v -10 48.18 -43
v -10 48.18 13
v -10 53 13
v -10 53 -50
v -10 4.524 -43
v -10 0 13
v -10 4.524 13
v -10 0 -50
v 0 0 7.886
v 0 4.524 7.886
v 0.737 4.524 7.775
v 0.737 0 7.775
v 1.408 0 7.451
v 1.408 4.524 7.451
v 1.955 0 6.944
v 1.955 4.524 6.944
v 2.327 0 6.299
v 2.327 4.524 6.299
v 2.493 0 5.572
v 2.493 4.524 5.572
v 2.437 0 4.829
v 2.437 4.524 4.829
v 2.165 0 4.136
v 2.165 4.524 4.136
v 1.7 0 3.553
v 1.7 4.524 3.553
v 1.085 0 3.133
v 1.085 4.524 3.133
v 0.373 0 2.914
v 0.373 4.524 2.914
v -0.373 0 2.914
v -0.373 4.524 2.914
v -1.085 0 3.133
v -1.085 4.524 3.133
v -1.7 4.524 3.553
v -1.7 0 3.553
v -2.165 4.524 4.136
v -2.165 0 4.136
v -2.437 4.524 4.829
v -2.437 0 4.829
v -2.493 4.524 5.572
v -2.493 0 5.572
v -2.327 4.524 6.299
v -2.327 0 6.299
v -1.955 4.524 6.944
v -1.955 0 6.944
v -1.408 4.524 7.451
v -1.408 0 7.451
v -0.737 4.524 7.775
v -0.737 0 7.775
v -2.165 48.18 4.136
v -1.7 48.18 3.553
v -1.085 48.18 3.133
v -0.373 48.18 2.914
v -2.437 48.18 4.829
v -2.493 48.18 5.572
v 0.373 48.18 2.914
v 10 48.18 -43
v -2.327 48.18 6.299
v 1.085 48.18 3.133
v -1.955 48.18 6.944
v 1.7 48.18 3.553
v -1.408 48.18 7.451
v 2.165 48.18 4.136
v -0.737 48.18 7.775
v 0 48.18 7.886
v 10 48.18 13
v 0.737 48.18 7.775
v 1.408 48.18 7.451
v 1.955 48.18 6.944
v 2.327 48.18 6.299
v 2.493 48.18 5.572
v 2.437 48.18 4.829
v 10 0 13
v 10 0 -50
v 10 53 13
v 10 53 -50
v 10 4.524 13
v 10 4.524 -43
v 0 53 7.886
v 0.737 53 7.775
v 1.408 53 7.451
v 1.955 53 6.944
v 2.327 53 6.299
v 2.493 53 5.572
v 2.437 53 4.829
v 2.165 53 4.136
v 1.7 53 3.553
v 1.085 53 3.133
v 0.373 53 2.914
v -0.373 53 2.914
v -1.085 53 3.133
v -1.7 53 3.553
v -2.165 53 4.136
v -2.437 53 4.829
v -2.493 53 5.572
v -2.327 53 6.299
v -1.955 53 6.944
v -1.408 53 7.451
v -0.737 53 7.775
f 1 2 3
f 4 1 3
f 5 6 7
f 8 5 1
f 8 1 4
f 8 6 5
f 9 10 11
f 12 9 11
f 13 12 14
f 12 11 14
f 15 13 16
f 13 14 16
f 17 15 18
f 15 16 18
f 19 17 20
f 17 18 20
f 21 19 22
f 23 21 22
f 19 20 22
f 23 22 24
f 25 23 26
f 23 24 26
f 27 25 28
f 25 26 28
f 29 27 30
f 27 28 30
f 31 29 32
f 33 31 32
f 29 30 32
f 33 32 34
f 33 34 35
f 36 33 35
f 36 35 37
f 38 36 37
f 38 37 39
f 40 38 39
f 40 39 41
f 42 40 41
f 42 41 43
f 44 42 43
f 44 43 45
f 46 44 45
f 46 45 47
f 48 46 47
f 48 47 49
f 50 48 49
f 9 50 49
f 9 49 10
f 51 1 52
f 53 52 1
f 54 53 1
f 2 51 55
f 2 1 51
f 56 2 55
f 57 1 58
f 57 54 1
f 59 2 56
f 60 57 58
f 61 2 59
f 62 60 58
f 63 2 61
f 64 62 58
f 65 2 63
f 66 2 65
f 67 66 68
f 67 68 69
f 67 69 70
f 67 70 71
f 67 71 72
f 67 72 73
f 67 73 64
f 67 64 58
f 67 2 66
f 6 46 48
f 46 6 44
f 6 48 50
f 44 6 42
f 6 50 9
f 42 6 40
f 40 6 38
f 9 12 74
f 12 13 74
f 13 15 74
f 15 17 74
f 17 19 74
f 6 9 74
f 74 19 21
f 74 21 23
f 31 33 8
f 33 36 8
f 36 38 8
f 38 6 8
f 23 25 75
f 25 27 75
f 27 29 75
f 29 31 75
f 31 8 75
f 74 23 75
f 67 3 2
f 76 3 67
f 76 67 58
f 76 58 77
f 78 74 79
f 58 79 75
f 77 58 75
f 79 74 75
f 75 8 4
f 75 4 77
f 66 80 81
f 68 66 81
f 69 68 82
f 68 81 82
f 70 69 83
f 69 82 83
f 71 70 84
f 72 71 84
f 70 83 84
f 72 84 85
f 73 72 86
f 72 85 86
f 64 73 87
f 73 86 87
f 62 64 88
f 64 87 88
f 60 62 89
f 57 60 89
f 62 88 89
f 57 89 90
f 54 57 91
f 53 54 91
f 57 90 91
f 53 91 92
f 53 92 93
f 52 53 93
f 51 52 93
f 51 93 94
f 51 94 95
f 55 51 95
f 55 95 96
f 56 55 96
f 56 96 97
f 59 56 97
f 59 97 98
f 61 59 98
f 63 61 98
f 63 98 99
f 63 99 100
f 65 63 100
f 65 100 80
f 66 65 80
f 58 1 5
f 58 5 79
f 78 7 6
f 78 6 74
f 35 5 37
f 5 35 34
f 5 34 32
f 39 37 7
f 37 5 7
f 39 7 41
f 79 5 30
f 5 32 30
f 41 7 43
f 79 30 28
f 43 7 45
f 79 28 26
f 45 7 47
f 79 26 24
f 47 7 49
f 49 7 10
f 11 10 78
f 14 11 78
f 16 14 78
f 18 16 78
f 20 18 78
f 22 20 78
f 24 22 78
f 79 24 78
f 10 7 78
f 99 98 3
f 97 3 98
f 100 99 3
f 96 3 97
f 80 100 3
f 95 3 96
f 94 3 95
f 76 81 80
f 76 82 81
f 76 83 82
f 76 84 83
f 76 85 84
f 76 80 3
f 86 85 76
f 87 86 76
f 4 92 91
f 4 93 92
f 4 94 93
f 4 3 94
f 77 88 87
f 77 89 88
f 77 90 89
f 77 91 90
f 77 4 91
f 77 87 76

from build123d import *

# Parameters (mm, degrees)
SKETCH1_W           = 20
SKETCH1_H           = 100
BOSS_EXTRUDE1_DEPTH = 53
SKETCH2_W           = 20
SKETCH2_H           = 22.115254232
CUT_EXTRUDE1_DEPTH  = 93
SKETCH3_R           = 2.5
CUT_EXTRUDE2_DEPTH  = 93
SKETCH4_W           = 20
SKETCH4_H           = 7.428579278
CUT_EXTRUDE3_DEPTH  = 93
SKETCH5_W           = 20
SKETCH5_H           = 14.111734172
CUT_EXTRUDE4_DEPTH  = 93
SKETCH6_R           = 2.5
CUT_EXTRUDE5_DEPTH  = 70
SKETCH7_W           = 20
SKETCH7_H           = 53
CUT_EXTRUDE6_DEPTH  = 37


with BuildPart() as part:
    # Sketch1 → Boss-Extrude1 (new body)
    with BuildSketch(Plane(origin=(0, 0, 0), x_dir=(1, 0, 0), z_dir=(0, 1, 0))):
        Rectangle(SKETCH1_W, SKETCH1_H)
    extrude(amount=BOSS_EXTRUDE1_DEPTH)

    # Sketch2 → Cut-Extrude1 (cut)
    with BuildSketch(Plane.XY.offset(50)):
        with Locations((0, 15.581680587)):
            Rectangle(SKETCH2_W, SKETCH2_H)
    extrude(amount=-CUT_EXTRUDE1_DEPTH, mode=Mode.SUBTRACT)

    # Sketch3 → Cut-Extrude2 (cut)
    with BuildSketch(Plane(origin=(0, 53, 0), x_dir=(1, 0, 0), z_dir=(0, 1, 0))):
        with Locations(Location((0, -43.339691346, 0), (0, 0, 270))):
            Circle(SKETCH3_R)
    extrude(amount=-CUT_EXTRUDE2_DEPTH, mode=Mode.SUBTRACT)

    # Sketch4 → Cut-Extrude3 (cut)
    with BuildSketch(Plane.XY.offset(50)):
        with Locations((0, 30.353597342)):
            Rectangle(SKETCH4_W, SKETCH4_H)
    extrude(amount=-CUT_EXTRUDE3_DEPTH, mode=Mode.SUBTRACT)

    # Sketch5 → Cut-Extrude4 (cut)
    with BuildSketch(Plane.XY.offset(50)):
        with Locations((0, 41.123754067)):
            Rectangle(SKETCH5_W, SKETCH5_H)
    extrude(amount=-CUT_EXTRUDE4_DEPTH, mode=Mode.SUBTRACT)

    # Sketch6 → Cut-Extrude5 (cut)
    with BuildSketch(Plane(origin=(0, 53, 0), x_dir=(1, 0, 0), z_dir=(0, 1, 0))):
        with Locations(Location((0, -5.385612406, 0), (0, 0, 270))):
            Circle(SKETCH6_R)
    extrude(amount=-CUT_EXTRUDE5_DEPTH, mode=Mode.SUBTRACT)

    # Sketch7 → Cut-Extrude6 (cut)
    with BuildSketch(Plane.XY.offset(50)):
        with Locations((0, 26.5)):
            Rectangle(SKETCH7_W, SKETCH7_H)
    extrude(amount=-CUT_EXTRUDE6_DEPTH, mode=Mode.SUBTRACT)


solid = part.part
